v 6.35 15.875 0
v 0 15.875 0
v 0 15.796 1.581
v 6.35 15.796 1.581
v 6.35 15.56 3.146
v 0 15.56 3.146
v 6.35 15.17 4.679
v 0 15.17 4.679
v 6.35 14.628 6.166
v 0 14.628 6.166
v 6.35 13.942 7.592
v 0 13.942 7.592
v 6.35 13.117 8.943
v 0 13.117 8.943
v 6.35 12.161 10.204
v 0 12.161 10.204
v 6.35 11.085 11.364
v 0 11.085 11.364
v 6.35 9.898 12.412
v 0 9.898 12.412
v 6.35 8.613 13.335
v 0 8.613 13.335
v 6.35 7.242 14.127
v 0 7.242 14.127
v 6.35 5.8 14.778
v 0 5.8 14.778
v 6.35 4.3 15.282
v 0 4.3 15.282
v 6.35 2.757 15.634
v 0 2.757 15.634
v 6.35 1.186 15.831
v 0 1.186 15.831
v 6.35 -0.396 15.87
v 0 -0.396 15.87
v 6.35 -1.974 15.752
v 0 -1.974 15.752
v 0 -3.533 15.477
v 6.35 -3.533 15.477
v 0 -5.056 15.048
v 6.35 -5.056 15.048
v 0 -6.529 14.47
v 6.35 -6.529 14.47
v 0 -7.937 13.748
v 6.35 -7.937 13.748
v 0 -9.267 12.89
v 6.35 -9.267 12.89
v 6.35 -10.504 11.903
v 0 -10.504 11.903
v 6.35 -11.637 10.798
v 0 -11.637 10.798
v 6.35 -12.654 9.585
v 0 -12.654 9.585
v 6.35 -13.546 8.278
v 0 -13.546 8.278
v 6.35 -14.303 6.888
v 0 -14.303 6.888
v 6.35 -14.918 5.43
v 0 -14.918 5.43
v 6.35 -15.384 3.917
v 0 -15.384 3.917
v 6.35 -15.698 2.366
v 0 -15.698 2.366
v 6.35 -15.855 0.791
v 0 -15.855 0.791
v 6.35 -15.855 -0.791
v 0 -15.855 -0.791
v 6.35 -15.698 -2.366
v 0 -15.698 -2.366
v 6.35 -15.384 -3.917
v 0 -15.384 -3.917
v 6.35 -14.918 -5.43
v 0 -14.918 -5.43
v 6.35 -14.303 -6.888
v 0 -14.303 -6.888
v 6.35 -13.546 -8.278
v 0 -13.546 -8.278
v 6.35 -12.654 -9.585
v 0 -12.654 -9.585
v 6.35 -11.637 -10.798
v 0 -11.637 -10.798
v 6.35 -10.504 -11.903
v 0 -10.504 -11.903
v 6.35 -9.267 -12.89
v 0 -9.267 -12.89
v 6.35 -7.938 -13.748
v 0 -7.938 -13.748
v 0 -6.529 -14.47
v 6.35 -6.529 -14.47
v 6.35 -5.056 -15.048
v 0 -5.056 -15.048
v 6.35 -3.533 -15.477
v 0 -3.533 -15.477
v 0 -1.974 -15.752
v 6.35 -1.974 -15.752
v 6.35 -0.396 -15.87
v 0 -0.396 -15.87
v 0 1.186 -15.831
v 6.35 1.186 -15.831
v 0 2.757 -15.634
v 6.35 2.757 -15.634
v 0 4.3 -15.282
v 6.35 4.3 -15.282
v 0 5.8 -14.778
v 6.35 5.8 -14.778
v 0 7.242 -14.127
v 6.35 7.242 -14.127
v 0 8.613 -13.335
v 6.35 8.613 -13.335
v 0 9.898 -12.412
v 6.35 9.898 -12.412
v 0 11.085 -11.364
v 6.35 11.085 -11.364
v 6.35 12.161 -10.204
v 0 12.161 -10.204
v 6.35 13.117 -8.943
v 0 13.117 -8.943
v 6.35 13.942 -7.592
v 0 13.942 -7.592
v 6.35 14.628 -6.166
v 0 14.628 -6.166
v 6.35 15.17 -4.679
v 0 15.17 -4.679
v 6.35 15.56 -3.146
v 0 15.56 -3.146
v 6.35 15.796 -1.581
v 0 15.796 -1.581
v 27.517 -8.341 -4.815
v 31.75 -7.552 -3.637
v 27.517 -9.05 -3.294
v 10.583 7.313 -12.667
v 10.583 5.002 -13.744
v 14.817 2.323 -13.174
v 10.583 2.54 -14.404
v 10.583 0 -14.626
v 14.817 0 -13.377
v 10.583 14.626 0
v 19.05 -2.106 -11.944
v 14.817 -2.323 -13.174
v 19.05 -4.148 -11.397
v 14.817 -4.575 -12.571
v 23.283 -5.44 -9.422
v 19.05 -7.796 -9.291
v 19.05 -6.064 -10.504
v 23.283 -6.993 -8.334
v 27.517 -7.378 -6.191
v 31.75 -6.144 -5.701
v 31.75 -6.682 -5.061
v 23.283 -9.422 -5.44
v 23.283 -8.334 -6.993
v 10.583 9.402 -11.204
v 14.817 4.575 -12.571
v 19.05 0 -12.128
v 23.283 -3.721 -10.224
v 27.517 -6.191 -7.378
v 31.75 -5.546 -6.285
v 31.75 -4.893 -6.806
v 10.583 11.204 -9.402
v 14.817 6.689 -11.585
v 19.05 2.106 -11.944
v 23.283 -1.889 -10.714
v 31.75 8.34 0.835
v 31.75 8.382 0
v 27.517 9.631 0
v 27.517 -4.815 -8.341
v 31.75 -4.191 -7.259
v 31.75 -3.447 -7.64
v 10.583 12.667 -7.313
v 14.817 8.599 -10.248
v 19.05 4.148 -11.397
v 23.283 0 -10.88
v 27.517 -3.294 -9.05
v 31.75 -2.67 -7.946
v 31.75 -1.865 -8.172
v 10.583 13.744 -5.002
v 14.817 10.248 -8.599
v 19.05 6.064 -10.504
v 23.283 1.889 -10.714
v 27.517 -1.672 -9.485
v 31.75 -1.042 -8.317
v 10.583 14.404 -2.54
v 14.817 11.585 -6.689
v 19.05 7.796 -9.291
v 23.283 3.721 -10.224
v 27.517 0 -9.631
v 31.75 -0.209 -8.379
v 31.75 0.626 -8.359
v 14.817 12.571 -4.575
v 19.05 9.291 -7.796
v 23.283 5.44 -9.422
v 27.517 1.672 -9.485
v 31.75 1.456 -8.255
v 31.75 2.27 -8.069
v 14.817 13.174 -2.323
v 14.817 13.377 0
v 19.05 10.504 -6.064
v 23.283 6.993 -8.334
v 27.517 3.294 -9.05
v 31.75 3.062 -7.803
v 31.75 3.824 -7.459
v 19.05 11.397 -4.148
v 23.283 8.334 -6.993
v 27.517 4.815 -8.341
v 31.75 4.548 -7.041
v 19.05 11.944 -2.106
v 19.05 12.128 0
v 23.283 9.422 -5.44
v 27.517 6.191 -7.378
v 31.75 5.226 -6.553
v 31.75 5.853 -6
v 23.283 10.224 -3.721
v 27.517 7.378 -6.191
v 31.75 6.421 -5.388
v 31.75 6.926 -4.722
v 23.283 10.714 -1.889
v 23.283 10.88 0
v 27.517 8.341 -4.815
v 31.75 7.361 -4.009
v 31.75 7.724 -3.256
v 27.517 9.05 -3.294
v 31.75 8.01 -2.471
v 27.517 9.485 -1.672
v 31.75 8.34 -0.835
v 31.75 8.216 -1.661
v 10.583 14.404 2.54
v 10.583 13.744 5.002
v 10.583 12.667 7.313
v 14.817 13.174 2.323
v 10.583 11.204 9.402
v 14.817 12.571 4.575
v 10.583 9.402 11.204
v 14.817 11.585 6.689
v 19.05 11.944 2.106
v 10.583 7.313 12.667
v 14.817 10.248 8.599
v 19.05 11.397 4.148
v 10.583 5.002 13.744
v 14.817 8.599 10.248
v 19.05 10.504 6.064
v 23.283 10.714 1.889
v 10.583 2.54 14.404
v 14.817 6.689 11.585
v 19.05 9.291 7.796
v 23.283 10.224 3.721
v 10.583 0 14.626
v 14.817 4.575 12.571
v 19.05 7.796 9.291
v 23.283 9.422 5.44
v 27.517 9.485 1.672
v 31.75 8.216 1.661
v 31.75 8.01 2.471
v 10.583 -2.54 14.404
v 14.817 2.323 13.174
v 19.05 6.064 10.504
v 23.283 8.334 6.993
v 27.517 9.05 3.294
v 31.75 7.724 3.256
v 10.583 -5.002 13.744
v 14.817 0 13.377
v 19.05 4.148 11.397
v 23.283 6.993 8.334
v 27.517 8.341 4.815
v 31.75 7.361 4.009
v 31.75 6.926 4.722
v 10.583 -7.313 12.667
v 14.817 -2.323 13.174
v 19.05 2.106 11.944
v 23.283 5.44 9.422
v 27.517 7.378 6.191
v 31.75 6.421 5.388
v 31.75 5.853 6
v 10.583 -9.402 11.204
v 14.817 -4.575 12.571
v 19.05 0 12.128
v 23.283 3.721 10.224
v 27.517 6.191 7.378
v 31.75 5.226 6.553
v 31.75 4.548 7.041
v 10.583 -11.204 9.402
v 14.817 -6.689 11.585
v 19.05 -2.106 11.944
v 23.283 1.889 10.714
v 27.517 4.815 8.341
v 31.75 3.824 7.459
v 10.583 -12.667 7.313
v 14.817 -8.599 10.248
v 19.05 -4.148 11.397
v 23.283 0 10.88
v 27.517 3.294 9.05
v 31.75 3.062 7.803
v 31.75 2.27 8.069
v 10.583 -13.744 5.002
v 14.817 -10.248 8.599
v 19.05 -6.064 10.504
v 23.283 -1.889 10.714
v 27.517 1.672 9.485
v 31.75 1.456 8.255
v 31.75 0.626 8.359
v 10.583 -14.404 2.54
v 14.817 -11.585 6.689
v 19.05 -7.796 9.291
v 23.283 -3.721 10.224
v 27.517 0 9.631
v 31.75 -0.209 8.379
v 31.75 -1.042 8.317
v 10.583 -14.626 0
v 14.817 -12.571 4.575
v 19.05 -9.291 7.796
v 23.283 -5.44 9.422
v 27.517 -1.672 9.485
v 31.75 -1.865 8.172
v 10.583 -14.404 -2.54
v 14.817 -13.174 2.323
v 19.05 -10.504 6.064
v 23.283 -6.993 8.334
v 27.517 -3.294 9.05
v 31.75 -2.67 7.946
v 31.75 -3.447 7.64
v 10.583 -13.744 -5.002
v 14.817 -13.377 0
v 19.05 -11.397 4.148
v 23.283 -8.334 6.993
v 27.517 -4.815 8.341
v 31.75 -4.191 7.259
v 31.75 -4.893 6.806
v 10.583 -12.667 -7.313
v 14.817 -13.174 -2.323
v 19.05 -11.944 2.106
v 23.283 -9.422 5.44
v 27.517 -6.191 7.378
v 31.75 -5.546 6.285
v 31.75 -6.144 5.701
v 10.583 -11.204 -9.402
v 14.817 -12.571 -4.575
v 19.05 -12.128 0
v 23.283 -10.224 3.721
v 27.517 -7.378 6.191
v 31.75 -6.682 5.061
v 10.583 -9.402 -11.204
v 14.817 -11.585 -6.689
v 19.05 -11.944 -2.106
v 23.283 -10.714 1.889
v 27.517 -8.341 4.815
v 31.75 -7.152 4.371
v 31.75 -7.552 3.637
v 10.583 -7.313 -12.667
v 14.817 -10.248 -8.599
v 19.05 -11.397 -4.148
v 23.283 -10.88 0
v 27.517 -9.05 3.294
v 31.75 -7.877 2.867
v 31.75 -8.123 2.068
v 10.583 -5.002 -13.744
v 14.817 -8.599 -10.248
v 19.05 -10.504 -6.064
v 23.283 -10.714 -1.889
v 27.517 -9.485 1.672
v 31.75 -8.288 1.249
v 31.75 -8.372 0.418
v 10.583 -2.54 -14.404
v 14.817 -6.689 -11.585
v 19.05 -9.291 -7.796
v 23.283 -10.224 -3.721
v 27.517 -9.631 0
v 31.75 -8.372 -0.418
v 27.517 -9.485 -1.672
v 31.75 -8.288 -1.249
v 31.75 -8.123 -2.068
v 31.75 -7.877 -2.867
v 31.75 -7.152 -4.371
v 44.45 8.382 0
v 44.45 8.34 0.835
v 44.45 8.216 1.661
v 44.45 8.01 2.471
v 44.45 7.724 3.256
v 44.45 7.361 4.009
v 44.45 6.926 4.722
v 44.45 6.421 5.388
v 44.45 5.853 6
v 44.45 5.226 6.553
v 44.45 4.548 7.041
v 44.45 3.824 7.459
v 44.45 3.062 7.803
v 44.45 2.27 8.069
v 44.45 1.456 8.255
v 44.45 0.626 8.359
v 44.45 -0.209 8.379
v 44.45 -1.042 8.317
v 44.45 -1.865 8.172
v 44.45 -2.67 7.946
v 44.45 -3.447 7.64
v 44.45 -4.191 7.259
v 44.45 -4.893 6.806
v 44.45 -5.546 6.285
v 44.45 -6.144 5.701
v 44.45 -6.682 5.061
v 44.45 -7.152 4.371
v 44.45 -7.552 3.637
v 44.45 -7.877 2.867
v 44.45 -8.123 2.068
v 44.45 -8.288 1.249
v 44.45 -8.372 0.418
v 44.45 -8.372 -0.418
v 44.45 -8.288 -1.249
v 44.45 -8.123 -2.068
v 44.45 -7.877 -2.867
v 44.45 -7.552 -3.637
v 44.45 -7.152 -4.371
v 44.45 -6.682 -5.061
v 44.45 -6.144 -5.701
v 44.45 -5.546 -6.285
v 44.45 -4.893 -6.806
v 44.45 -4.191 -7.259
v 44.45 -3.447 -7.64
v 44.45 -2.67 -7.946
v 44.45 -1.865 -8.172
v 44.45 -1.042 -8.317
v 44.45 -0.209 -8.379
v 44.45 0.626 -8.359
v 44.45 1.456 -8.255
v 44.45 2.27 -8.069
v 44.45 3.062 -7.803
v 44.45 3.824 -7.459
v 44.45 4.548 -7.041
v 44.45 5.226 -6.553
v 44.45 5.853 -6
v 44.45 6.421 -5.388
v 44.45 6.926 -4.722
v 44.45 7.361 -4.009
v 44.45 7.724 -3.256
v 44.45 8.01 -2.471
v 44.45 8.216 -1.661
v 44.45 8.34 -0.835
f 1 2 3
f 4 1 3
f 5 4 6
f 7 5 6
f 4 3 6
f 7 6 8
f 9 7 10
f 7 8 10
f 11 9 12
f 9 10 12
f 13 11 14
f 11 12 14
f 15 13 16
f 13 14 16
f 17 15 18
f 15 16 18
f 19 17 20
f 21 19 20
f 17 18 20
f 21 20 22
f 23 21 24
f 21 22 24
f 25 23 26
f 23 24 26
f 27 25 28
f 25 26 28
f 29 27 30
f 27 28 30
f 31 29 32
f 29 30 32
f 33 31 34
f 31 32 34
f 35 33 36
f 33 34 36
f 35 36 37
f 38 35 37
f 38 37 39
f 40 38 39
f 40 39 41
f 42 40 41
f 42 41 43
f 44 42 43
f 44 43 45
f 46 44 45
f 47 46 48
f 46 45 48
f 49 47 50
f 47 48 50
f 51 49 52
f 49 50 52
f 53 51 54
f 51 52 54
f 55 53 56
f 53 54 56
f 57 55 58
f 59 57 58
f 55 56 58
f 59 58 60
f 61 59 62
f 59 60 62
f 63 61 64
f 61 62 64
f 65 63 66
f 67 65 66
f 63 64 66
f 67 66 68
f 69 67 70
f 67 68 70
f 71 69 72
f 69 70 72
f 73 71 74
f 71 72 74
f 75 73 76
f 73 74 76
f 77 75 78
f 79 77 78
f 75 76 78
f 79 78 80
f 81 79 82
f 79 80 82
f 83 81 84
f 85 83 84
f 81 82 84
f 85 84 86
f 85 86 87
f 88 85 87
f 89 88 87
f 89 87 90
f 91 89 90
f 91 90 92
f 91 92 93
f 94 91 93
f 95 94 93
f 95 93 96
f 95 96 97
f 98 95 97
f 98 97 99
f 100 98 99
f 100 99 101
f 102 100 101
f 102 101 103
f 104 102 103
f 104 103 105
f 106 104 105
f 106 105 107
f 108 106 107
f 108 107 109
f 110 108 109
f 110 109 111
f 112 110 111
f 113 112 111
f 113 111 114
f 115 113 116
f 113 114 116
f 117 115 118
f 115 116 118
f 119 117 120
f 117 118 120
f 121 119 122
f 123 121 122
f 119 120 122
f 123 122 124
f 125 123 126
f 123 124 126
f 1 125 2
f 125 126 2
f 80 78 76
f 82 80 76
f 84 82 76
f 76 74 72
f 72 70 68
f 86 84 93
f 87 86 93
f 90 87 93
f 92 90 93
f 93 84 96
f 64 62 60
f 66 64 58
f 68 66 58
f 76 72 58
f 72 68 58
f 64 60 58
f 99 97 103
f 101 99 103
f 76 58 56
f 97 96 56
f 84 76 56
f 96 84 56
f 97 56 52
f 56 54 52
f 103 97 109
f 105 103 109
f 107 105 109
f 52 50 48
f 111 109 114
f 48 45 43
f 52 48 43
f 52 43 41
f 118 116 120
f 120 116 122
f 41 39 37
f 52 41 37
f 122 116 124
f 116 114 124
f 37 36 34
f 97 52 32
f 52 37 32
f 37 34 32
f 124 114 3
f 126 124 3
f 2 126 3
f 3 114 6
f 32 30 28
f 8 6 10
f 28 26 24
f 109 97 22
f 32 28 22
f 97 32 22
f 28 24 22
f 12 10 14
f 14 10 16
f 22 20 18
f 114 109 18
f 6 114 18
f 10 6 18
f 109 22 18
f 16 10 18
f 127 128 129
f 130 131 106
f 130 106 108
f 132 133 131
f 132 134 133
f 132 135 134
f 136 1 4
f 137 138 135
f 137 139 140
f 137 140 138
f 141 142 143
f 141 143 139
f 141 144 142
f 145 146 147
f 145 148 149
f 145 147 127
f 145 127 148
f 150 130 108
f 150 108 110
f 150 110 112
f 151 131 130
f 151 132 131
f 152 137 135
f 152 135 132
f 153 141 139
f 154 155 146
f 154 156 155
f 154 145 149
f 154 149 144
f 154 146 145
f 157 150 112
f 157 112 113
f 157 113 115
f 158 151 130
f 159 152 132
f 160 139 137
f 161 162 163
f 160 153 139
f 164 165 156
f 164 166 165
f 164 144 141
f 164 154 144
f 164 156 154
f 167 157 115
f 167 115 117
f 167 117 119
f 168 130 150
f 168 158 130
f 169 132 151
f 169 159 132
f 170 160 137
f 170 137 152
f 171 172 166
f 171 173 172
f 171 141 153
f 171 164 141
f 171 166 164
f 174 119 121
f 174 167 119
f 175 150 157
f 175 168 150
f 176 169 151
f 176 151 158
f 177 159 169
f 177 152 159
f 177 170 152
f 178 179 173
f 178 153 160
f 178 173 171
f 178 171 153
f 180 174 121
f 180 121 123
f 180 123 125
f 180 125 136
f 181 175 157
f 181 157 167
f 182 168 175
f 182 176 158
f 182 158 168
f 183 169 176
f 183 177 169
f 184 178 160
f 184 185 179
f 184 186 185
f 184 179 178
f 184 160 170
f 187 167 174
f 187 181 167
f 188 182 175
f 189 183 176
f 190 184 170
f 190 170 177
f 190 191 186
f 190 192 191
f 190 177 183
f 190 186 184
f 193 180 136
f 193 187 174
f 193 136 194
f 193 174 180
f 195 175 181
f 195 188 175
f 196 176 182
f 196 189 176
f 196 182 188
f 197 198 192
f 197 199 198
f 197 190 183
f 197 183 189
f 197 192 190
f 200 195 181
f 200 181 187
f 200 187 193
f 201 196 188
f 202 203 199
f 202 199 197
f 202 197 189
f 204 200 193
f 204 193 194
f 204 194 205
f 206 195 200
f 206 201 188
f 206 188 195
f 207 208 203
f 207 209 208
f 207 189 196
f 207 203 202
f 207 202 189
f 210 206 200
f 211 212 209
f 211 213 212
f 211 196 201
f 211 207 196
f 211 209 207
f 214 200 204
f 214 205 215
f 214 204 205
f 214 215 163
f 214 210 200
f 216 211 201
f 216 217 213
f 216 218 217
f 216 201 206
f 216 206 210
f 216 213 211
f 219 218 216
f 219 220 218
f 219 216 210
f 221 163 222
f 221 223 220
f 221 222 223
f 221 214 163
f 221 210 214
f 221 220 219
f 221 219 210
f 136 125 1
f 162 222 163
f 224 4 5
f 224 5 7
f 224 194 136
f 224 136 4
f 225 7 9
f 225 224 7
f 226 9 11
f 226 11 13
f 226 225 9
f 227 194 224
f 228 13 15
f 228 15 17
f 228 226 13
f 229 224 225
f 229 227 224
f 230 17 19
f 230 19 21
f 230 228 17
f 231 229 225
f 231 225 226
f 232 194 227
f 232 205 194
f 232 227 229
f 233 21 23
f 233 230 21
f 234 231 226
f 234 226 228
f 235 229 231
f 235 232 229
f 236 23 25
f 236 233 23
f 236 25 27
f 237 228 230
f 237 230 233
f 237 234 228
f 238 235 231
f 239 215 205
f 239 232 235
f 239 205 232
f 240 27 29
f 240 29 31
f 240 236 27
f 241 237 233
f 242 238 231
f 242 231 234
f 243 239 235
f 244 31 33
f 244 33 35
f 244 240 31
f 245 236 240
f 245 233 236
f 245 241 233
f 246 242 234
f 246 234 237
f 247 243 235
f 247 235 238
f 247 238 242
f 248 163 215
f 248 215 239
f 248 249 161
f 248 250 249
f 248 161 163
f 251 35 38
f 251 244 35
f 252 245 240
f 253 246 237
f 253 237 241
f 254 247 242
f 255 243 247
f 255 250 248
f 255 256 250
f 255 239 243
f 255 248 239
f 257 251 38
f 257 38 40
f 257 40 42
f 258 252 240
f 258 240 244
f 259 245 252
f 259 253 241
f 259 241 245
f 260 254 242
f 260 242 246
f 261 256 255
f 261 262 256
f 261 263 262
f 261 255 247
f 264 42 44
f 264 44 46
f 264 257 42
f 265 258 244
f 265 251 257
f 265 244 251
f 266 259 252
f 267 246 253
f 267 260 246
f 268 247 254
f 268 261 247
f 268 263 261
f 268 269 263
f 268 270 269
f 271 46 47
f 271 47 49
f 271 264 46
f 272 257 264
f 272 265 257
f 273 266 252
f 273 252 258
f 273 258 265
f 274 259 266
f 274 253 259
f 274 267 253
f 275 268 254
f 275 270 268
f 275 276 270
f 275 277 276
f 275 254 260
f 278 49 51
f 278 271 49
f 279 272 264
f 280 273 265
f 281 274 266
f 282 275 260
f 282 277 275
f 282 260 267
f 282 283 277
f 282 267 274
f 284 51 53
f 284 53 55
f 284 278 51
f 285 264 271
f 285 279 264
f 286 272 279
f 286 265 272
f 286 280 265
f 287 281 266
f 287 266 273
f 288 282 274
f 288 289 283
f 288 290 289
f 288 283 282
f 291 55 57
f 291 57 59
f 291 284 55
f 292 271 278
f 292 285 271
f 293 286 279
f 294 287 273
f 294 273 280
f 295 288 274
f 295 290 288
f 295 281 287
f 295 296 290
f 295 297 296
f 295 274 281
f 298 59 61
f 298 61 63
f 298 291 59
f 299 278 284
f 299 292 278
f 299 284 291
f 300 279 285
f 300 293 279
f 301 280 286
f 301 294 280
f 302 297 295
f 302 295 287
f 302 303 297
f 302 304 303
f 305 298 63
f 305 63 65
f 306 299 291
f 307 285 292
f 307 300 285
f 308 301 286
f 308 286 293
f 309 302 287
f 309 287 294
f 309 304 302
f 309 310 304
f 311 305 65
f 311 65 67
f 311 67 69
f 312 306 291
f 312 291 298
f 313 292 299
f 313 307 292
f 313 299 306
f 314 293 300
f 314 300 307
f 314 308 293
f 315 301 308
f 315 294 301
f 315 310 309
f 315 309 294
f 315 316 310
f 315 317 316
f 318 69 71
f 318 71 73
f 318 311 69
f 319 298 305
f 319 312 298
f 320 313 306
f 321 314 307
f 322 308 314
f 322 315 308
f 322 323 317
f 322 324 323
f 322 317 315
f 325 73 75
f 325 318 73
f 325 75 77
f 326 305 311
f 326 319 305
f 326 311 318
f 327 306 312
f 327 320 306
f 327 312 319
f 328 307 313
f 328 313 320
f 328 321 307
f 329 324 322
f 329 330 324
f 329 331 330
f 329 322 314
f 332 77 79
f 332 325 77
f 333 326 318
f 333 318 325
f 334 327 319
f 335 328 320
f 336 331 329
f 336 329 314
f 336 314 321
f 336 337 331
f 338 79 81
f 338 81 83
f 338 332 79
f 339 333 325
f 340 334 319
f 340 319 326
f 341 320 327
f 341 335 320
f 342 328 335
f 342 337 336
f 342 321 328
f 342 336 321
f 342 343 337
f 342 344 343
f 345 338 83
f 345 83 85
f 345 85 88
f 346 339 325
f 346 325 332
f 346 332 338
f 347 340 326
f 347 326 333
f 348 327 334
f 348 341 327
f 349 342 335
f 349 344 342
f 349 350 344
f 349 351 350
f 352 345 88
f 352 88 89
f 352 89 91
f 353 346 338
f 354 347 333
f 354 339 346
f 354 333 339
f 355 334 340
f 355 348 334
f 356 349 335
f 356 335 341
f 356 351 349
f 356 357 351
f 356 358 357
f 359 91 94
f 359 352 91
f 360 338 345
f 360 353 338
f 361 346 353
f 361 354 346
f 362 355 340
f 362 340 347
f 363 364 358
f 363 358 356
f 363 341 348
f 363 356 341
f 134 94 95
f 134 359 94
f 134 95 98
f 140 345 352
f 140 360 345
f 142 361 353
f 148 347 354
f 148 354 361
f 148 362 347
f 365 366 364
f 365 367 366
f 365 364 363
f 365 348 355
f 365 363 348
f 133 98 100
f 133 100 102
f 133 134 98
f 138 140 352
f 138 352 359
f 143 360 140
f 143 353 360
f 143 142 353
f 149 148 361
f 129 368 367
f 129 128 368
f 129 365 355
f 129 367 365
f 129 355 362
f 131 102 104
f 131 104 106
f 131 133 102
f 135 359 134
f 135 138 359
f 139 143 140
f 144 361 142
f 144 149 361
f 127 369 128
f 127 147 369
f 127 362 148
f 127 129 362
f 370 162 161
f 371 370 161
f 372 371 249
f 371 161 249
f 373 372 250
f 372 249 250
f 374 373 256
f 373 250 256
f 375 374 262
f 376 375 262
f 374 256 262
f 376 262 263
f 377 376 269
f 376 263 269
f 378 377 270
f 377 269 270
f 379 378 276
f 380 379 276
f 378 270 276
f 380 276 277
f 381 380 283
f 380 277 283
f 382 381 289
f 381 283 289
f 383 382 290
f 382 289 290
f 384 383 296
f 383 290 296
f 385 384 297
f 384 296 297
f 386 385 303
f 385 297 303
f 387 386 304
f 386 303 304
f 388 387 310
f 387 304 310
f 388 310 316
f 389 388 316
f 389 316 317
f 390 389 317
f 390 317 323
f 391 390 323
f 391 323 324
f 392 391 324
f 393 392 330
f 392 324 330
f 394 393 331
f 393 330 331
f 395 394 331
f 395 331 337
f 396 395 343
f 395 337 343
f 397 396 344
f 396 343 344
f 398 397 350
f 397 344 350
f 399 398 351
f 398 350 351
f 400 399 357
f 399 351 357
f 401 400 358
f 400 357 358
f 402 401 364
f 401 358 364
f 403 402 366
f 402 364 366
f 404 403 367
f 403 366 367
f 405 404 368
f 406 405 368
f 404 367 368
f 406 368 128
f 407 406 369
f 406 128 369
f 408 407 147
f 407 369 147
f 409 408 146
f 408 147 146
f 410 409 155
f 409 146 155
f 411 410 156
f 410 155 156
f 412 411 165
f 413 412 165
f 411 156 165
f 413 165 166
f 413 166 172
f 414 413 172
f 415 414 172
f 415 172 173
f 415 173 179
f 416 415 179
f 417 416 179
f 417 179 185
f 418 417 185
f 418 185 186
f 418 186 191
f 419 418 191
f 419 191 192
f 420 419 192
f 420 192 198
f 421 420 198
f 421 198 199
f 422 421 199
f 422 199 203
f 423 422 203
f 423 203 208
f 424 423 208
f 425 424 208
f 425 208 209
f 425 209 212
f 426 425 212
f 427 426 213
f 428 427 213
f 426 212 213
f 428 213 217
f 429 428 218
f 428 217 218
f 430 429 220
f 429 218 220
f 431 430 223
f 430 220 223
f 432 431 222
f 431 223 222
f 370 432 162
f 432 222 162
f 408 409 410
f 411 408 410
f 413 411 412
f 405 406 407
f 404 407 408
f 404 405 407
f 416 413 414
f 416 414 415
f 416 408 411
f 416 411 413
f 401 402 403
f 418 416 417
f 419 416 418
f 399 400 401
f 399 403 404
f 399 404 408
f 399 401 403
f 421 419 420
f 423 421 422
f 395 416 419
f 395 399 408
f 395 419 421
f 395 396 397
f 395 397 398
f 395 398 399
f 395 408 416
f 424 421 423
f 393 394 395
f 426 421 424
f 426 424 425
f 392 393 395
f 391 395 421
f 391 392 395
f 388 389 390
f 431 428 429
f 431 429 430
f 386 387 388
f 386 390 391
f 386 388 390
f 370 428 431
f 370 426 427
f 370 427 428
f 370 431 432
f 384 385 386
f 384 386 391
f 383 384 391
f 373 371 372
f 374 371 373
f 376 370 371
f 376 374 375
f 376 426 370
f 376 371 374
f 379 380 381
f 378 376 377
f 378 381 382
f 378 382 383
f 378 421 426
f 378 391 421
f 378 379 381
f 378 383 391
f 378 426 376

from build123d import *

# Parameters (mm, degrees)
F0_R      = 15.875
F1_DEPTH  = 6.35
F1_FACE_R = 15.875
F3_R      = 8.382
F5_R      = 8.382
F6_DEPTH  = 12.7


with BuildPart() as f1:
    # F0 (on Right) → F1 (new body)
    with BuildSketch(Plane.YZ):
        Circle(F0_R)
    extrude(amount=F1_DEPTH)

    # F1_face (on face) → F4 section 0
    with BuildSketch(Plane.YZ.offset(6.35)):
        Circle(F1_FACE_R)
    # F3 (on offset) → F4 section 1
    with BuildSketch(Plane.YZ.offset(31.75)):
        Circle(F3_R)
    loft()

    # F5 (on face) → F6 (join)
    with BuildSketch(Plane.YZ.offset(31.75)):
        Circle(F5_R)
    extrude(amount=F6_DEPTH)


solid = f1.part
